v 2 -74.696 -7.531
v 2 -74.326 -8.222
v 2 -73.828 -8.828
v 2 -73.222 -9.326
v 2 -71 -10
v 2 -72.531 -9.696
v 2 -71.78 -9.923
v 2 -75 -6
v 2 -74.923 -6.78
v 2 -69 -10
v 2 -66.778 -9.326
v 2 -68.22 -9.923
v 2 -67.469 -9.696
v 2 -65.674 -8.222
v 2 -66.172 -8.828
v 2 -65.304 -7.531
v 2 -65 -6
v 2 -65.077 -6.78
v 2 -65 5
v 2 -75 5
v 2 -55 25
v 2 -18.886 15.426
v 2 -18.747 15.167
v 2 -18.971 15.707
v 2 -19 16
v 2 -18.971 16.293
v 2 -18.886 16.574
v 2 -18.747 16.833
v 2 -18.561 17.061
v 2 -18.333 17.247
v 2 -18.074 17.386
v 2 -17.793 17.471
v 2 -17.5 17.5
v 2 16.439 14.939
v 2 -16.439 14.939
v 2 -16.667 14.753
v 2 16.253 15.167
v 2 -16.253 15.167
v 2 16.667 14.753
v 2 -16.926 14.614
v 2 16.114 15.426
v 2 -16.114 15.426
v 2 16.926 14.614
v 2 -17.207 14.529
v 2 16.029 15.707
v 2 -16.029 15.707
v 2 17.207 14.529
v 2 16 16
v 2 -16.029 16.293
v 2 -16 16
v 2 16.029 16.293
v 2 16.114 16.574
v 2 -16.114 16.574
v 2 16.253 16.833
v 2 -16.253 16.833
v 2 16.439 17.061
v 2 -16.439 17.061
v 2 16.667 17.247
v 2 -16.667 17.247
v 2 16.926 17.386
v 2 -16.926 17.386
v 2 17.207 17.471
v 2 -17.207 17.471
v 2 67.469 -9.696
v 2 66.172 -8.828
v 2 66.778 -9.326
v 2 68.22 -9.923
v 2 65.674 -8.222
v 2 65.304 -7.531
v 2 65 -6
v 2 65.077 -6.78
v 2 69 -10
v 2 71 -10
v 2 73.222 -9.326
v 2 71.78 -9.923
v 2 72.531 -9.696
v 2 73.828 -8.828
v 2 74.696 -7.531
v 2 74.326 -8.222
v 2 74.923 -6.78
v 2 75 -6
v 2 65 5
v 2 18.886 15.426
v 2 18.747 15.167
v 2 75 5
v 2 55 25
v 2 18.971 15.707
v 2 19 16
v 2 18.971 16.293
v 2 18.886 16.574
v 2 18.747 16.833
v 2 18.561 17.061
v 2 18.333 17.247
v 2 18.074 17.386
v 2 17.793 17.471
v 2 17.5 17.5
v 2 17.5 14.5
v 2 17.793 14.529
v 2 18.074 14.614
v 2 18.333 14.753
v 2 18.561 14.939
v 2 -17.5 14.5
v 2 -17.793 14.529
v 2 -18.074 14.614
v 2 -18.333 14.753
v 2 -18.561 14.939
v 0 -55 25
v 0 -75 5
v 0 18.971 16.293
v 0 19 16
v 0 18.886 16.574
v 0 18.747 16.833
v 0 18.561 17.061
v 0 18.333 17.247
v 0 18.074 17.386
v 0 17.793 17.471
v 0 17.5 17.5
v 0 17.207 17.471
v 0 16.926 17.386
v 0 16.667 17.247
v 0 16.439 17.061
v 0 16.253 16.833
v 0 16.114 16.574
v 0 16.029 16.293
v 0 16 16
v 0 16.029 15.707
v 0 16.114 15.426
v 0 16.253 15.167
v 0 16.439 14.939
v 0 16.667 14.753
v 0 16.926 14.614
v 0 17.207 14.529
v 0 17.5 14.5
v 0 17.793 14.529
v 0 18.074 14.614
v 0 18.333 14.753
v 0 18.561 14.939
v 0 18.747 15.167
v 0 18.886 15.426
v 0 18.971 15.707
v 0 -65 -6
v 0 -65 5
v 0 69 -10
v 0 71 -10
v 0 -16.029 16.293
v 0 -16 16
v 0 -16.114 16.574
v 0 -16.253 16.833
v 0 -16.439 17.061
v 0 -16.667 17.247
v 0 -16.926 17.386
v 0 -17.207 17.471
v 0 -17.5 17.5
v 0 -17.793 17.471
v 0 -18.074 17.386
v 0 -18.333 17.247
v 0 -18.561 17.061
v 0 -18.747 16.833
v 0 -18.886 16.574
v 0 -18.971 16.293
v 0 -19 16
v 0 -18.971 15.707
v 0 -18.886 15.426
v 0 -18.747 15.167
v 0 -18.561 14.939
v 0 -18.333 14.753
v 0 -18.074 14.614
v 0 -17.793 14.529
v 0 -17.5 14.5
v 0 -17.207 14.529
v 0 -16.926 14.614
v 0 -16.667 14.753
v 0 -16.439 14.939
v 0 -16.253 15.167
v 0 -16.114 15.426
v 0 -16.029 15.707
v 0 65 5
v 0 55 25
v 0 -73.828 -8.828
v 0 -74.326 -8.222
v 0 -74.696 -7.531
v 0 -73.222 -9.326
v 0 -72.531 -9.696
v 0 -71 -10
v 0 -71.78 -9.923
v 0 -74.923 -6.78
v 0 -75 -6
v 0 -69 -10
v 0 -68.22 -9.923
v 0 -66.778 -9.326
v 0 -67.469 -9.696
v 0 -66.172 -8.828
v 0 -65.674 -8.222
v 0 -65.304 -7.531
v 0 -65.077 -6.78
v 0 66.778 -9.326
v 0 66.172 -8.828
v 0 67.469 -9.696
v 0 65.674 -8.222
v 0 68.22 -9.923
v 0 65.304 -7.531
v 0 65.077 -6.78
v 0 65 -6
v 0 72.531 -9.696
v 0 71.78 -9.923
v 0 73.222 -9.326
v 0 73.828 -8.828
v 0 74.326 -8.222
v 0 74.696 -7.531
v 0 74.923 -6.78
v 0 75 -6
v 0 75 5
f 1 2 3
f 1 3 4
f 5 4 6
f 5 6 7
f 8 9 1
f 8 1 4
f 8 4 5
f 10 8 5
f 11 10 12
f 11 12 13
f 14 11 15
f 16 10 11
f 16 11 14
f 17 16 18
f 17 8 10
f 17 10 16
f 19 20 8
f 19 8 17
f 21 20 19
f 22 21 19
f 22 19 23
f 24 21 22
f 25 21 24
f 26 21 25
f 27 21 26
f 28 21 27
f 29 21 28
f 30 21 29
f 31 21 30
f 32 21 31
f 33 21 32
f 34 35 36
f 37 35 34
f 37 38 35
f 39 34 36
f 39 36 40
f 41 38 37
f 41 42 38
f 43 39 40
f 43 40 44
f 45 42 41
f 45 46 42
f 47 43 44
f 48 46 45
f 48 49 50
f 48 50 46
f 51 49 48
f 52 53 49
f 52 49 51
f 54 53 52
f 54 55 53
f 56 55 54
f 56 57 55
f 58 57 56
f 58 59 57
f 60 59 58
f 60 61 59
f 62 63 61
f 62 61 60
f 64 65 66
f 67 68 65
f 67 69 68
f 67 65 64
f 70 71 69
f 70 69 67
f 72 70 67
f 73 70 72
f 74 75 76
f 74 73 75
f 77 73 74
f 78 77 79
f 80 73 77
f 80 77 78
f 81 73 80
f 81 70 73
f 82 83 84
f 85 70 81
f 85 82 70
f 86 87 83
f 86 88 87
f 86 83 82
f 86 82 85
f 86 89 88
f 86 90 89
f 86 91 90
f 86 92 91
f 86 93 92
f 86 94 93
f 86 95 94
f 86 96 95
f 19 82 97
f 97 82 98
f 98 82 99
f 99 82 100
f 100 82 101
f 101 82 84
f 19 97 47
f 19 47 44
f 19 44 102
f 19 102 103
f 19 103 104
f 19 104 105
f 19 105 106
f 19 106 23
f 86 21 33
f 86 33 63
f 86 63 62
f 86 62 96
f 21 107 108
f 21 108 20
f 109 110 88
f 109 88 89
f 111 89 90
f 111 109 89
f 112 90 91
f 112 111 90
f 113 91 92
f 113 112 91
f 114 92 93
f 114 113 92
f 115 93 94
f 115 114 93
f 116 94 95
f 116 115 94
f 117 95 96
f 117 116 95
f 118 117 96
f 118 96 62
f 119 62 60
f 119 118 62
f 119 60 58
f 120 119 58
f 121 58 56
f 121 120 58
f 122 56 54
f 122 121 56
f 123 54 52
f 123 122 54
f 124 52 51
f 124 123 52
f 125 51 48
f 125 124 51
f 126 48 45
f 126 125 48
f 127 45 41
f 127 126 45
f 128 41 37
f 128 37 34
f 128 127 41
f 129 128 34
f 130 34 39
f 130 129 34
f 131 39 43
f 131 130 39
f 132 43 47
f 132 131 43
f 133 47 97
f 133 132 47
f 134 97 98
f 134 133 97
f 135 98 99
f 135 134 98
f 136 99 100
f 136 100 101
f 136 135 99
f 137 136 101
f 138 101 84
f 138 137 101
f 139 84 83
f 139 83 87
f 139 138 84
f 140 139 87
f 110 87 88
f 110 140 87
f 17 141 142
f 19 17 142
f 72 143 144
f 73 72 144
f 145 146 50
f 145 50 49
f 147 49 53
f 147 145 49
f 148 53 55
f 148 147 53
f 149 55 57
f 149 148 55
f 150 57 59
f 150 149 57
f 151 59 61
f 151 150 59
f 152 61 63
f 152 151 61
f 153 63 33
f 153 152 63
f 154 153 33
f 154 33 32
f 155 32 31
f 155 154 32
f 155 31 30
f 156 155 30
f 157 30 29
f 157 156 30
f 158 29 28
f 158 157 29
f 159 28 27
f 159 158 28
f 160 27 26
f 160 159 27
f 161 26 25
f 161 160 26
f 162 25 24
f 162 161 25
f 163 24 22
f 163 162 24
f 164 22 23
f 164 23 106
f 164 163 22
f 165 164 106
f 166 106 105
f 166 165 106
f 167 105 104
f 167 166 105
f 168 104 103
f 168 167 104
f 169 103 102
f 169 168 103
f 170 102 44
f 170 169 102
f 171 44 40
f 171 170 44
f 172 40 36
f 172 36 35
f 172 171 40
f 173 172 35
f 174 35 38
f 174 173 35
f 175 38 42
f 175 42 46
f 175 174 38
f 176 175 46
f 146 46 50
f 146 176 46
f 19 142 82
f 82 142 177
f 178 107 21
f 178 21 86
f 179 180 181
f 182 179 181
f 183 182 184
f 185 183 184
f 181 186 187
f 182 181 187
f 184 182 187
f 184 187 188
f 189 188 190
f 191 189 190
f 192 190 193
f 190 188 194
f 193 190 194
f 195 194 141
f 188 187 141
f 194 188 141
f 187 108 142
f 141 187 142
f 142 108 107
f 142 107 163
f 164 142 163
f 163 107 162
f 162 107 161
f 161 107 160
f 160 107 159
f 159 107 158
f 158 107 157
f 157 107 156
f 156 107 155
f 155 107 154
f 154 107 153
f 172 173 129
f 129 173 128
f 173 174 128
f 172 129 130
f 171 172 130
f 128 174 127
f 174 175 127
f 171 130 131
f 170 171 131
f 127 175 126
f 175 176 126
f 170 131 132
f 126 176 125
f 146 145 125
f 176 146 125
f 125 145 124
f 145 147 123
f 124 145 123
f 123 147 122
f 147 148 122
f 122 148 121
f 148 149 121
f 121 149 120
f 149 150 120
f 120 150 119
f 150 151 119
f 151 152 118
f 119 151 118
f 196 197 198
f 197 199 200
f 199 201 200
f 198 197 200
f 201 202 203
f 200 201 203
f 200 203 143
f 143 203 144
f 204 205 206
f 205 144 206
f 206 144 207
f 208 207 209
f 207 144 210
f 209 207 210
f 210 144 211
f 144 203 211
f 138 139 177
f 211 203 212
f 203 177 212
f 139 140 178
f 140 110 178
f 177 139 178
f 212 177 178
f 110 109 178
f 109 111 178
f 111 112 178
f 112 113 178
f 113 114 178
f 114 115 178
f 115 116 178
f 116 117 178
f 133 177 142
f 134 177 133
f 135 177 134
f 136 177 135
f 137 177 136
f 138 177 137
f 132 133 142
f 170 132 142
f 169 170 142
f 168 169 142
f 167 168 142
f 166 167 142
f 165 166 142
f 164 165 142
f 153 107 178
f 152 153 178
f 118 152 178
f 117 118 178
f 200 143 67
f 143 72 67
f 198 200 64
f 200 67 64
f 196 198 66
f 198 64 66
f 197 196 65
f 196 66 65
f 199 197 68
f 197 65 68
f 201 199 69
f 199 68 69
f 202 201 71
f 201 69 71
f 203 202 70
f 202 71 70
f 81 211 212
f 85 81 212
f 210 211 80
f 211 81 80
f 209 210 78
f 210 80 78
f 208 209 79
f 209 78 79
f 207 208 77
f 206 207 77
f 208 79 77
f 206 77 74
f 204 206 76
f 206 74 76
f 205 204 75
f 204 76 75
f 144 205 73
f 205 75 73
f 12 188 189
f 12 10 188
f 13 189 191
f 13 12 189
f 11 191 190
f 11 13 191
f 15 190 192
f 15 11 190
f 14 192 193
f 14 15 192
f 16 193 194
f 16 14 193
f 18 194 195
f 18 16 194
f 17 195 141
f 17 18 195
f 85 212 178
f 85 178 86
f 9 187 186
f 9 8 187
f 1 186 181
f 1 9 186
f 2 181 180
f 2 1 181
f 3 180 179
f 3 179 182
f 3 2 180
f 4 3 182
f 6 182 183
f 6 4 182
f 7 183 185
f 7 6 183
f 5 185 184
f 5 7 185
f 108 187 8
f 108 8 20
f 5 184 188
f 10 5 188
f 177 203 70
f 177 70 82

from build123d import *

# Parameters (mm, degrees)
SKETCH018_W     = 150
SKETCH018_H     = 35
PAD010_DEPTH    = 2
SKETCH019_W     = 130
SKETCH019_H     = 50
POCKET007_DEPTH = 2
FILLET_R        = 4
SKETCH020_R     = 1.5
POCKET008_DEPTH = 2
CHAMFER002_SIZE = 20


with BuildPart() as part:
    # Sketch018 → Pad010 (new body)
    with BuildSketch(Plane.YZ):
        with Locations((0, 7.5)):
            Rectangle(SKETCH018_W, SKETCH018_H)
    extrude(amount=PAD010_DEPTH)

    # Sketch019 → Pocket007 (cut)
    with BuildSketch(Plane.YZ):
        with Locations((0, -20)):
            Rectangle(SKETCH019_W, SKETCH019_H)
    extrude(amount=POCKET007_DEPTH, mode=Mode.SUBTRACT)

    # Fillet
    fillet_edges = [part.edges().sort_by_distance(p)[0] for p in [
        (1, -65, -10),
        (1, -75, -10),
        (1, 65, -10),
        (1, 75, -10),
    ]]
    fillet(fillet_edges, radius=FILLET_R)

    # Sketch020 → Pocket008 (cut)
    with BuildSketch(Plane.YZ):
        with Locations((17.5, 16)):
            Circle(SKETCH020_R)
        with Locations((-17.5, 16)):
            Circle(SKETCH020_R)
    extrude(amount=POCKET008_DEPTH, mode=Mode.SUBTRACT)

    # Chamfer002
    chamfer002_edges = [part.edges().sort_by_distance(p)[0] for p in [
        (1, -75, 25),
        (1, 75, 25),
    ]]
    chamfer(chamfer002_edges, length=CHAMFER002_SIZE)


solid = part.part
